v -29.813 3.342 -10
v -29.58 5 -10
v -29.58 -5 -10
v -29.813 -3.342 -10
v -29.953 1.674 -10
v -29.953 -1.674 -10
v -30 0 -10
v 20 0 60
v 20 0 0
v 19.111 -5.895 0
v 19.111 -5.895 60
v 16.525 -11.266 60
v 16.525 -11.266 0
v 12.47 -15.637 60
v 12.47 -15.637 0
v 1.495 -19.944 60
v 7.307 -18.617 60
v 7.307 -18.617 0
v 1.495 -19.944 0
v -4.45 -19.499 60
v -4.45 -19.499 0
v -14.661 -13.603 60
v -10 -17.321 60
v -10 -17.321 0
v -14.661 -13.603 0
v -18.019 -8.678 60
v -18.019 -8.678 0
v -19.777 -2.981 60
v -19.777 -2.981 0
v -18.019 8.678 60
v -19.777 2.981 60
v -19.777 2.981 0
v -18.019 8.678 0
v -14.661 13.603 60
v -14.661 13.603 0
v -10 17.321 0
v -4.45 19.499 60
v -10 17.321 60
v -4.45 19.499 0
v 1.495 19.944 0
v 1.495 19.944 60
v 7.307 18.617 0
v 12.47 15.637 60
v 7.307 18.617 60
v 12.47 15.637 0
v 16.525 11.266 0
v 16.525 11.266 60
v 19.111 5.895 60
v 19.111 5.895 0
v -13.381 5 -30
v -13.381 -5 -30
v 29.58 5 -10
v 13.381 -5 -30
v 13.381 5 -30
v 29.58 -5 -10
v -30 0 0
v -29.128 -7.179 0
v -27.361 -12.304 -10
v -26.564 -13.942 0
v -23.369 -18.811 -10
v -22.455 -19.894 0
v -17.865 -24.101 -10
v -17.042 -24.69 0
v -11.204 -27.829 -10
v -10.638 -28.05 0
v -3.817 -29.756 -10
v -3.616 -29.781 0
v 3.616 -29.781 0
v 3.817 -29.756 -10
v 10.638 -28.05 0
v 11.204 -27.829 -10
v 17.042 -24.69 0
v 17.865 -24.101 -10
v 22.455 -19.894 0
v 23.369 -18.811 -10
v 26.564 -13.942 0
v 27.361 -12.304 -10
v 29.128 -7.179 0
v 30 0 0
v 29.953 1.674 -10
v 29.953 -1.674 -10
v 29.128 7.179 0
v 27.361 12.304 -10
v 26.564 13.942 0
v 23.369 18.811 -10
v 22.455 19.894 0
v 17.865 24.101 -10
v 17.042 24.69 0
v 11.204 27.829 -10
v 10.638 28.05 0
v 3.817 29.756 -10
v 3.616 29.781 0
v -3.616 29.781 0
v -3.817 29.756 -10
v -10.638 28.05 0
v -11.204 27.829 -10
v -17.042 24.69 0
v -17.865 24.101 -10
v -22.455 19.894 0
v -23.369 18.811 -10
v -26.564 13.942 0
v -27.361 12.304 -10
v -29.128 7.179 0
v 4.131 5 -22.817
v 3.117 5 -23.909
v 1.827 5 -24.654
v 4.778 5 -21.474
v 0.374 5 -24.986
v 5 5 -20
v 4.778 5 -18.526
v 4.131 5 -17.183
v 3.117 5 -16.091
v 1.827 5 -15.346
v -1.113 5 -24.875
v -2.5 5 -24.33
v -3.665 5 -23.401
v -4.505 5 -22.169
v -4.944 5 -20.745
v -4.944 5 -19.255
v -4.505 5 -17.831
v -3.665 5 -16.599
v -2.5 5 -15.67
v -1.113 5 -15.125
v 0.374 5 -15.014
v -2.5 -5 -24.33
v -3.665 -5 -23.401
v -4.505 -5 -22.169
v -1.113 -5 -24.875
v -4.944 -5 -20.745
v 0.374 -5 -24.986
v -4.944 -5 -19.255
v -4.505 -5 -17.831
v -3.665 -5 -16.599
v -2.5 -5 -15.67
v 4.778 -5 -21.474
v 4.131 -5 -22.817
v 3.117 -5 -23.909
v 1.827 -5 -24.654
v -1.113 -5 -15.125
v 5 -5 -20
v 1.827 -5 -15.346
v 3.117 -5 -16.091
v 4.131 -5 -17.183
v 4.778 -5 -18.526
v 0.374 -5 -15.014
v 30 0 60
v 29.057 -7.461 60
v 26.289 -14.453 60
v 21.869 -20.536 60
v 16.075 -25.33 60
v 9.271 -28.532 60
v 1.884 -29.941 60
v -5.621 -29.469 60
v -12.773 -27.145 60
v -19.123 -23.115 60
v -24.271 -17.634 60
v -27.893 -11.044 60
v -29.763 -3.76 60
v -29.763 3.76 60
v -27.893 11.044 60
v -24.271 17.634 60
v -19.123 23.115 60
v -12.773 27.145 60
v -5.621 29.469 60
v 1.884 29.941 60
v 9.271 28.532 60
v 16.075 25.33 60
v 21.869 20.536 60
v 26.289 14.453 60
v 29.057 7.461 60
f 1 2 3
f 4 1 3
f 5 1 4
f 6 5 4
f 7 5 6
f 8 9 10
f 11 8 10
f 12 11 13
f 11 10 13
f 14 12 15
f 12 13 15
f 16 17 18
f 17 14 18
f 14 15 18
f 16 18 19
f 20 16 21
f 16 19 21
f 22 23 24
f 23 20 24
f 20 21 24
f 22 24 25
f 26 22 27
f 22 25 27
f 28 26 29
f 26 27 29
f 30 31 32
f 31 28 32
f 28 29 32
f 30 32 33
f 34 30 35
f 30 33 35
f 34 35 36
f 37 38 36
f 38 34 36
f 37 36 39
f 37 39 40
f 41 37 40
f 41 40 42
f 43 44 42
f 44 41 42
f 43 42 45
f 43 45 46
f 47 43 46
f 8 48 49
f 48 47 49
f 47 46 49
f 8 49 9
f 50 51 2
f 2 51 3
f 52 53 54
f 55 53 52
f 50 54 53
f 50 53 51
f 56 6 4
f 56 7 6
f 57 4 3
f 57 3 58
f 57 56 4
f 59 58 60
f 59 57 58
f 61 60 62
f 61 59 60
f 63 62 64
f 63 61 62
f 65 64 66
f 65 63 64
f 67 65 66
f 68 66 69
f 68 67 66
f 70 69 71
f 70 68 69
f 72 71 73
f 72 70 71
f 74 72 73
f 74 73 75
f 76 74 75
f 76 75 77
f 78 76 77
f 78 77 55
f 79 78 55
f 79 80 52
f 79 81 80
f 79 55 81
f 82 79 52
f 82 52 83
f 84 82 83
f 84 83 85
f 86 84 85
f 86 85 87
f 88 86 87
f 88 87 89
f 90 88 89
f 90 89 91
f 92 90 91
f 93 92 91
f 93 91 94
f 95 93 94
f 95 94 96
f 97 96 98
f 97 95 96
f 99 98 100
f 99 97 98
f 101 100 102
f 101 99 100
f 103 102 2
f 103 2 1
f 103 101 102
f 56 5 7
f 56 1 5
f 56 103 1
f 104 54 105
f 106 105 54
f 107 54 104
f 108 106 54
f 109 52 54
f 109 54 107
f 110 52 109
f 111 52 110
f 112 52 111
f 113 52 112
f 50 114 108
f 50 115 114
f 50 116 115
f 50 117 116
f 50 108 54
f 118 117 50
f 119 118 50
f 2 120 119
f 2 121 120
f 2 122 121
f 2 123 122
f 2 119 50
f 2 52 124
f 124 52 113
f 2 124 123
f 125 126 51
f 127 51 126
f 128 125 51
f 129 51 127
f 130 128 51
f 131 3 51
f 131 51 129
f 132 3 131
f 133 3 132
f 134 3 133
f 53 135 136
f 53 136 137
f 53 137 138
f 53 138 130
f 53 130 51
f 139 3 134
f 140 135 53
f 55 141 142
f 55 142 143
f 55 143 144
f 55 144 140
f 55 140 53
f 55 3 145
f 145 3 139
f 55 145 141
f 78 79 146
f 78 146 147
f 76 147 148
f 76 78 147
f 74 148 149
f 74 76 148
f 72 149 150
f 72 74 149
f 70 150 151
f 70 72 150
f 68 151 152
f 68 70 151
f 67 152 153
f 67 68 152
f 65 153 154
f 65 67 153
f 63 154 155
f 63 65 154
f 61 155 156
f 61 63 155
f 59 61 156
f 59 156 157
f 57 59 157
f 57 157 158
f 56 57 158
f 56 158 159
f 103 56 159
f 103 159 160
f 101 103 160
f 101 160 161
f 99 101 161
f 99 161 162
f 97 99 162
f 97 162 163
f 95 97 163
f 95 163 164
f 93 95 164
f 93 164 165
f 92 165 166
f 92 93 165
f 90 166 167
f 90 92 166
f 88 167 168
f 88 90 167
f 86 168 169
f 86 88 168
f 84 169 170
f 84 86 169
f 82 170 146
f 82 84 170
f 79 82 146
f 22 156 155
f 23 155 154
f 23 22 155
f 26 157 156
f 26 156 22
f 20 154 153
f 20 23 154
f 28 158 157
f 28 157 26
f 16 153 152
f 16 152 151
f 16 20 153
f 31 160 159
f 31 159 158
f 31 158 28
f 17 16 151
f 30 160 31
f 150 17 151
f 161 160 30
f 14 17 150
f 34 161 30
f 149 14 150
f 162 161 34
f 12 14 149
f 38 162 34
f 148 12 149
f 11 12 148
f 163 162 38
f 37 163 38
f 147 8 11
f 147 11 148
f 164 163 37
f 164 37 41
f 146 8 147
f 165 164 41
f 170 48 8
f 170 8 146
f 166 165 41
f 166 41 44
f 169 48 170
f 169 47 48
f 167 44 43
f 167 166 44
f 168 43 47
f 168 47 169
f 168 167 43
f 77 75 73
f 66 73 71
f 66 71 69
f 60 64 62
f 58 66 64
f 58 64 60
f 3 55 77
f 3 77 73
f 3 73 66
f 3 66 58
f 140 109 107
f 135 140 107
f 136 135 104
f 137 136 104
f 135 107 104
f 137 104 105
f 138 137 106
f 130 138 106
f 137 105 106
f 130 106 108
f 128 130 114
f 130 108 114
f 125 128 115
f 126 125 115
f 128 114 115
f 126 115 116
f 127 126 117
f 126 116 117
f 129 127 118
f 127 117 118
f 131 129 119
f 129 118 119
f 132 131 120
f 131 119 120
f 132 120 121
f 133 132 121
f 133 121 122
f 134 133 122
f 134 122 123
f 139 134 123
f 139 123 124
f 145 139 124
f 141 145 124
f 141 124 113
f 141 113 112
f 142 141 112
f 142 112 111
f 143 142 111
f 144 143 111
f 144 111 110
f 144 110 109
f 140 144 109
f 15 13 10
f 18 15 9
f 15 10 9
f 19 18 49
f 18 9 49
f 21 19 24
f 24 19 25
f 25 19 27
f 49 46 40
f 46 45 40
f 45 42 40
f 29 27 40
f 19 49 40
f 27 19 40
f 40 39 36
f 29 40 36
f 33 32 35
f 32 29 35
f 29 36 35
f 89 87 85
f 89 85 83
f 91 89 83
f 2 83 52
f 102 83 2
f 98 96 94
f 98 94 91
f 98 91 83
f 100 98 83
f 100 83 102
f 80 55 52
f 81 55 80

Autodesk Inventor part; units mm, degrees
ref_plane "YZ Plane" through (0, 0, 0) normal (1, 0, 0) x (0, 1, 0)
ref_plane "XZ Plane" through (0, 0, 0) normal (0, 1, 0) x (-1, 0, 0)
ref_plane "XY Plane" through (0, 0, 0) normal (0, 0, 1) x (1, 0, 0)
sketch "Эскиз1" plane through (0, 0, 0) normal (0, 0, 1) x (1, 0, 0)
  circle A0 centre (0, 0) radius 20
  circle A1 centre (0, 0) radius 30
  dimension "d0" = 40
  dimension "d1" = 10
extrude "Выдавливание1" add sketch "Эскиз1" along normal blind 60
sketch "Эскиз2" plane through (0, 0, 0) normal (0, 0, -1) x (-1, 0, 0)
  circle A0 centre (0, 0) radius 30 projected
extrude "Выдавливание2" add sketch "Эскиз2" along normal blind 10
sketch "Эскиз3" plane through (0, 0, -10) normal (0, 0, -1) x (-1, 0, 0)
  circle A0 centre (0, 0) radius 30 projected
  line L0 (-29.5804, 5) -> (29.5804, 5)
  line L1 (29.5804, -5) -> (-29.5804, -5)
  line L2 (42, 0) -> (-42, 0) projected
  dimension "d7" = 10
extrude "Выдавливание3" add sketch "Эскиз3" along normal blind 20 contours L2 A0 L0 | A0 L1 L2
sketch "Эскиз4" plane through (-29.5804, 5, -10) normal (0, 1, 0) x (1, 0, 0)
  line L0 (59.1608, 0) -> (0, 0) projected
  line L1 (59.1608, 0) -> (59.1608, 20) projected
  line L2 (0, 20) -> (59.1608, 20) projected
  line L3 (0, 0) -> (0, 20) projected
  line L4 (59.1608, 0) -> (59.1608, 20) projected
  line L5 (0, 0) -> (59.1608, 0) projected
  line L6 (0, 0) -> (0, 20) projected
  line L7 (0, 20) -> (59.1608, 20) projected
  circle A0 centre (29.5804, 10) radius 5
  point P0 (29.5804, -10)
  dimension "d11" = 10
extrude "Выдавливание4" cut sketch "Эскиз4" along normal through all both and the other way through all contours A0
sketch "Эскиз5" plane through (-29.5804, -5, -10) normal (0, -1, 0) x (1, 0, 0)
  circle A0 centre (29.5804, -10) radius 5 projected
  line L0 (59.1608, -20) -> (0, -20) projected
  line L1 (0, 0) -> (59.1608, 0) projected
  line L2 (0, 0) -> (0, -20) projected
  line L3 (16.199, -20) -> (0, 0)
  line L4 (0, 0) -> (-30.1779, 0)
  line L5 (-30.1779, 0) -> (-30.1779, -20)
  line L6 (-30.1779, -20) -> (16.199, -20)
  line L7 (42.9618, -20) -> (59.1608, 0)
  line L8 (85.3862, 0) -> (85.3862, -20)
  line L9 (85.3862, -20) -> (42.9618, -20)
  line L10 (85.3862, 0) -> (59.1608, 0)
  point P0 (29.5804, 10)
extrude "Выдавливание5" cut sketch "Эскиз5" against normal through all contours L0 L7 L10 L8 L9 | L0 L2 L3 | L6 L5 L4 L2
properties part number "стакан_v2" material "Сталь"
